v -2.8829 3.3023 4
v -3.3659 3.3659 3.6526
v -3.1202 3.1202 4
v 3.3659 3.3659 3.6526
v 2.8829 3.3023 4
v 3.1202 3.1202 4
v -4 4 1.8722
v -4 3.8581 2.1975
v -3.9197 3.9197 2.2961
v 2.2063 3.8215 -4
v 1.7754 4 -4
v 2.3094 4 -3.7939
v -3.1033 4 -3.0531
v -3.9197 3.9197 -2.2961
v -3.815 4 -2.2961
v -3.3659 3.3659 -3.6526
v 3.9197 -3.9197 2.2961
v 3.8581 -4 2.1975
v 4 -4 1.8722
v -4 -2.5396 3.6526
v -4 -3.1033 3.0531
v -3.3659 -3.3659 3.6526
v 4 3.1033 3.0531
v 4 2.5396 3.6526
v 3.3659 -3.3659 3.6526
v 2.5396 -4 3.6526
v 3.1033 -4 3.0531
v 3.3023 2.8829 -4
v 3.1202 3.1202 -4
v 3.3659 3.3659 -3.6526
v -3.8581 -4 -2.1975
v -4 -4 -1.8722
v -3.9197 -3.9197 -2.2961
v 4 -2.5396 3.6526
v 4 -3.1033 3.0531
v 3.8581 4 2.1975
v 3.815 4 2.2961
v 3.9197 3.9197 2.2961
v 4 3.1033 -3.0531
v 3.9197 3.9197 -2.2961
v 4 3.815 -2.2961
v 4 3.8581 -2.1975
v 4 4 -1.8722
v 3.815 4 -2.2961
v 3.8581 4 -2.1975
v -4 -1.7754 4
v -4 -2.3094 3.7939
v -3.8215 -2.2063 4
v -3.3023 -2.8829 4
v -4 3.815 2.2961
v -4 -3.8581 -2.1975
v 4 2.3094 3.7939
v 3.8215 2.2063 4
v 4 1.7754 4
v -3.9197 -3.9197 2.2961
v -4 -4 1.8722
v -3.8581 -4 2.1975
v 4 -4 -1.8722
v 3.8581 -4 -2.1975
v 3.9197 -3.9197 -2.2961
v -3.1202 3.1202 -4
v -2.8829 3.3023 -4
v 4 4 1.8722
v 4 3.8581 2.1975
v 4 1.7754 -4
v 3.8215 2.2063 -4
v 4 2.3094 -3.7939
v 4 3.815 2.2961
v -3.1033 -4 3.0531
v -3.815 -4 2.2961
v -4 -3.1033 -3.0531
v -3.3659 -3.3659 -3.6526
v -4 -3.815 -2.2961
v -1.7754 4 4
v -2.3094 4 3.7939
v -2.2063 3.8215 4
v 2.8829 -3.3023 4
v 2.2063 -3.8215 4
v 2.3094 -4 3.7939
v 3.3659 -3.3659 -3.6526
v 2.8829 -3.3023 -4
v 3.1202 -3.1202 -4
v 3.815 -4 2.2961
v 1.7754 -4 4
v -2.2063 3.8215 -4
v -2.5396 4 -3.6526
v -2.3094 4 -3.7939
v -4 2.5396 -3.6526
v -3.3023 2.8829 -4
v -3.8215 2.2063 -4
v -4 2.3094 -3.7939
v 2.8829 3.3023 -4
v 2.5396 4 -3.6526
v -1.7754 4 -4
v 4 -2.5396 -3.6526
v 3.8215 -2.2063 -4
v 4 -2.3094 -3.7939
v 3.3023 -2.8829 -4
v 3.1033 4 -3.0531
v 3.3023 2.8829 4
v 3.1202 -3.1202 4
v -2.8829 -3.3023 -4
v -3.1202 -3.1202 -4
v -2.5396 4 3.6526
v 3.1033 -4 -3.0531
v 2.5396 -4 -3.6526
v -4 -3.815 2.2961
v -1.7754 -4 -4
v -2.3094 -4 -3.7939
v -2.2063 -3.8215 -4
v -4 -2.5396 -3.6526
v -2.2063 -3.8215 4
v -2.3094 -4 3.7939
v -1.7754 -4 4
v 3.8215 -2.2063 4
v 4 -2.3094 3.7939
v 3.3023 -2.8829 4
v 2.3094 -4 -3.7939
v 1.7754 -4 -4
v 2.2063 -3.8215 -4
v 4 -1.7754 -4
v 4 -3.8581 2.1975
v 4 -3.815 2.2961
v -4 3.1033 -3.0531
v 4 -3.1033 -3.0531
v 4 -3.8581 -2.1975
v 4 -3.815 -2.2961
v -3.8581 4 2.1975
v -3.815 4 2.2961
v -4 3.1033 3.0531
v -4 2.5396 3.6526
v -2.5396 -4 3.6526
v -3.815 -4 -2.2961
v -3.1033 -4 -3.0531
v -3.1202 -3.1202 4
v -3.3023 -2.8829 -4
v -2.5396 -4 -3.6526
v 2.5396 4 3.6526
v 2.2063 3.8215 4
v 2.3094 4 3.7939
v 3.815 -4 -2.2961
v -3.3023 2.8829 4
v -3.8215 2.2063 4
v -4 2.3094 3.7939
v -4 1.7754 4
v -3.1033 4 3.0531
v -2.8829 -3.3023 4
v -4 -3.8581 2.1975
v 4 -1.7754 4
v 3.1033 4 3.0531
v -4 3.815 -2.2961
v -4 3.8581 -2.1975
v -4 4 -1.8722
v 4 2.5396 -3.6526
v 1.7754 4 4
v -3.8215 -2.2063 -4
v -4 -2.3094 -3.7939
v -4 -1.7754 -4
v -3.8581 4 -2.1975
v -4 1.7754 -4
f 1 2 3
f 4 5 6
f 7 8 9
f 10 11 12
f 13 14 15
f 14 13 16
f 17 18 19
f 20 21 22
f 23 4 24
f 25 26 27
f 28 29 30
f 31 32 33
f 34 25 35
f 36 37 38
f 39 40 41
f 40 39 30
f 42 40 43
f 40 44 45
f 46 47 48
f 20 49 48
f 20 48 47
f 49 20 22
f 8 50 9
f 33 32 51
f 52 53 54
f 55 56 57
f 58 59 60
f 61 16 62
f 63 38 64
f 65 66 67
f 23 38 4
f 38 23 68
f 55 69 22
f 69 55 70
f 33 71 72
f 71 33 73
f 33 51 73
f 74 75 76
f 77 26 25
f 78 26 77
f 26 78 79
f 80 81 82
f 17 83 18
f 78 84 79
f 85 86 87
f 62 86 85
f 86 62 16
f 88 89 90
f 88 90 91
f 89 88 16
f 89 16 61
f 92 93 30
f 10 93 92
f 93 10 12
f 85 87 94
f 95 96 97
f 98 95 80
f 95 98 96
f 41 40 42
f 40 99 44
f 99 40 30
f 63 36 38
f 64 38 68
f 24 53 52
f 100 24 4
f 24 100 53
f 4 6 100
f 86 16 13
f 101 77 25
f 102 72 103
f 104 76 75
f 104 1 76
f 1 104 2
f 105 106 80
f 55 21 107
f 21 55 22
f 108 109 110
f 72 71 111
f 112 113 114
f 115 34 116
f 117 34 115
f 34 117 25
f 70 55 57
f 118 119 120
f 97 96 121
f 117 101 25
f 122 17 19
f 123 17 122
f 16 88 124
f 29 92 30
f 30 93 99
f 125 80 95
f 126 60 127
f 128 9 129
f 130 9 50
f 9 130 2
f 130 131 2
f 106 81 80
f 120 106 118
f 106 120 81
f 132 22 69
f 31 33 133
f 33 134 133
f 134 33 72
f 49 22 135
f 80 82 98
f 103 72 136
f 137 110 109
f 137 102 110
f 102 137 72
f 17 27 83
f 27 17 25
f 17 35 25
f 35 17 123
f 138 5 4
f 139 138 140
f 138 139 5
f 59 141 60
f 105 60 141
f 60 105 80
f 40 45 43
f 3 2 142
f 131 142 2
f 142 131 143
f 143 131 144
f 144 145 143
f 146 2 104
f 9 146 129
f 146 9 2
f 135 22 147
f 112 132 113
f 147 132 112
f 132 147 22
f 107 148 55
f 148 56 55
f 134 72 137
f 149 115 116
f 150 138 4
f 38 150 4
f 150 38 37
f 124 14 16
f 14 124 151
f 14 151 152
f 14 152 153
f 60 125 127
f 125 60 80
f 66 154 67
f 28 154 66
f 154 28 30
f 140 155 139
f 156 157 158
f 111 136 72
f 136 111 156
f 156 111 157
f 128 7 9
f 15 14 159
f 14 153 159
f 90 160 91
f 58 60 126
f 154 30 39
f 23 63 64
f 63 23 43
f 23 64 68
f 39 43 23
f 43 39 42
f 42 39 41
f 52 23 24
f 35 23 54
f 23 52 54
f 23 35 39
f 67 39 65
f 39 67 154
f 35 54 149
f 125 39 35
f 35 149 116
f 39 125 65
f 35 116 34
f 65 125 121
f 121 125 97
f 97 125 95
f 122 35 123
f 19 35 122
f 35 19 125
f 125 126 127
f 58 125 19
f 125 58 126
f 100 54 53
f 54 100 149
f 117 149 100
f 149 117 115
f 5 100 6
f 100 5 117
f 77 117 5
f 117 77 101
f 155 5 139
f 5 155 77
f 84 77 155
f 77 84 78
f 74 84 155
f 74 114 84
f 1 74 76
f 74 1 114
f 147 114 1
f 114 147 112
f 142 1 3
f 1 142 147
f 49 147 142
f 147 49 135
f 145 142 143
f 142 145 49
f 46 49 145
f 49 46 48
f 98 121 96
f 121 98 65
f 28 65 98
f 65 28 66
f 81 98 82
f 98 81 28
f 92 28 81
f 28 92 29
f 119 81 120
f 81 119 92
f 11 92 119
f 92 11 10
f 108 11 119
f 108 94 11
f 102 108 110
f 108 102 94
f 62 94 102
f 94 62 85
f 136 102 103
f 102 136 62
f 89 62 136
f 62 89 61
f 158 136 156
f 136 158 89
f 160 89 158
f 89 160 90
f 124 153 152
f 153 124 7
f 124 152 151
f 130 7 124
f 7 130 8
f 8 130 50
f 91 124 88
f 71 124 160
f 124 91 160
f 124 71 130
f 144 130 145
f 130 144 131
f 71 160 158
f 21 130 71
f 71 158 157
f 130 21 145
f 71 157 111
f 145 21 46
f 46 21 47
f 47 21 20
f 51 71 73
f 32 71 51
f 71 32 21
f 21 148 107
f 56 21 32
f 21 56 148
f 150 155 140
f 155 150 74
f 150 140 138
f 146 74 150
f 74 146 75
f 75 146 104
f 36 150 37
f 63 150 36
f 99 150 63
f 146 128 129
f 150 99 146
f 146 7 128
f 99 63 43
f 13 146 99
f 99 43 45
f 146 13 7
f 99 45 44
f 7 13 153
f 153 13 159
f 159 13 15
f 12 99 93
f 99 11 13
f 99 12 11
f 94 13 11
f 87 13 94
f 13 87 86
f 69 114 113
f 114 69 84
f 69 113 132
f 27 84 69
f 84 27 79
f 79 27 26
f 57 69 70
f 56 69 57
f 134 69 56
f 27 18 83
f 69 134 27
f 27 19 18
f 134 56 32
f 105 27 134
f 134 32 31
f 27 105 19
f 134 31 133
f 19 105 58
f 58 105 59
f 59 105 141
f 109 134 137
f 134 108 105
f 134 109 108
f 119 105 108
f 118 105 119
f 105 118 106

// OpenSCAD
// sphere intersected with a cube
intersection() {
  sphere(6, $fn = 24);
  cube(8, center = true);
}
